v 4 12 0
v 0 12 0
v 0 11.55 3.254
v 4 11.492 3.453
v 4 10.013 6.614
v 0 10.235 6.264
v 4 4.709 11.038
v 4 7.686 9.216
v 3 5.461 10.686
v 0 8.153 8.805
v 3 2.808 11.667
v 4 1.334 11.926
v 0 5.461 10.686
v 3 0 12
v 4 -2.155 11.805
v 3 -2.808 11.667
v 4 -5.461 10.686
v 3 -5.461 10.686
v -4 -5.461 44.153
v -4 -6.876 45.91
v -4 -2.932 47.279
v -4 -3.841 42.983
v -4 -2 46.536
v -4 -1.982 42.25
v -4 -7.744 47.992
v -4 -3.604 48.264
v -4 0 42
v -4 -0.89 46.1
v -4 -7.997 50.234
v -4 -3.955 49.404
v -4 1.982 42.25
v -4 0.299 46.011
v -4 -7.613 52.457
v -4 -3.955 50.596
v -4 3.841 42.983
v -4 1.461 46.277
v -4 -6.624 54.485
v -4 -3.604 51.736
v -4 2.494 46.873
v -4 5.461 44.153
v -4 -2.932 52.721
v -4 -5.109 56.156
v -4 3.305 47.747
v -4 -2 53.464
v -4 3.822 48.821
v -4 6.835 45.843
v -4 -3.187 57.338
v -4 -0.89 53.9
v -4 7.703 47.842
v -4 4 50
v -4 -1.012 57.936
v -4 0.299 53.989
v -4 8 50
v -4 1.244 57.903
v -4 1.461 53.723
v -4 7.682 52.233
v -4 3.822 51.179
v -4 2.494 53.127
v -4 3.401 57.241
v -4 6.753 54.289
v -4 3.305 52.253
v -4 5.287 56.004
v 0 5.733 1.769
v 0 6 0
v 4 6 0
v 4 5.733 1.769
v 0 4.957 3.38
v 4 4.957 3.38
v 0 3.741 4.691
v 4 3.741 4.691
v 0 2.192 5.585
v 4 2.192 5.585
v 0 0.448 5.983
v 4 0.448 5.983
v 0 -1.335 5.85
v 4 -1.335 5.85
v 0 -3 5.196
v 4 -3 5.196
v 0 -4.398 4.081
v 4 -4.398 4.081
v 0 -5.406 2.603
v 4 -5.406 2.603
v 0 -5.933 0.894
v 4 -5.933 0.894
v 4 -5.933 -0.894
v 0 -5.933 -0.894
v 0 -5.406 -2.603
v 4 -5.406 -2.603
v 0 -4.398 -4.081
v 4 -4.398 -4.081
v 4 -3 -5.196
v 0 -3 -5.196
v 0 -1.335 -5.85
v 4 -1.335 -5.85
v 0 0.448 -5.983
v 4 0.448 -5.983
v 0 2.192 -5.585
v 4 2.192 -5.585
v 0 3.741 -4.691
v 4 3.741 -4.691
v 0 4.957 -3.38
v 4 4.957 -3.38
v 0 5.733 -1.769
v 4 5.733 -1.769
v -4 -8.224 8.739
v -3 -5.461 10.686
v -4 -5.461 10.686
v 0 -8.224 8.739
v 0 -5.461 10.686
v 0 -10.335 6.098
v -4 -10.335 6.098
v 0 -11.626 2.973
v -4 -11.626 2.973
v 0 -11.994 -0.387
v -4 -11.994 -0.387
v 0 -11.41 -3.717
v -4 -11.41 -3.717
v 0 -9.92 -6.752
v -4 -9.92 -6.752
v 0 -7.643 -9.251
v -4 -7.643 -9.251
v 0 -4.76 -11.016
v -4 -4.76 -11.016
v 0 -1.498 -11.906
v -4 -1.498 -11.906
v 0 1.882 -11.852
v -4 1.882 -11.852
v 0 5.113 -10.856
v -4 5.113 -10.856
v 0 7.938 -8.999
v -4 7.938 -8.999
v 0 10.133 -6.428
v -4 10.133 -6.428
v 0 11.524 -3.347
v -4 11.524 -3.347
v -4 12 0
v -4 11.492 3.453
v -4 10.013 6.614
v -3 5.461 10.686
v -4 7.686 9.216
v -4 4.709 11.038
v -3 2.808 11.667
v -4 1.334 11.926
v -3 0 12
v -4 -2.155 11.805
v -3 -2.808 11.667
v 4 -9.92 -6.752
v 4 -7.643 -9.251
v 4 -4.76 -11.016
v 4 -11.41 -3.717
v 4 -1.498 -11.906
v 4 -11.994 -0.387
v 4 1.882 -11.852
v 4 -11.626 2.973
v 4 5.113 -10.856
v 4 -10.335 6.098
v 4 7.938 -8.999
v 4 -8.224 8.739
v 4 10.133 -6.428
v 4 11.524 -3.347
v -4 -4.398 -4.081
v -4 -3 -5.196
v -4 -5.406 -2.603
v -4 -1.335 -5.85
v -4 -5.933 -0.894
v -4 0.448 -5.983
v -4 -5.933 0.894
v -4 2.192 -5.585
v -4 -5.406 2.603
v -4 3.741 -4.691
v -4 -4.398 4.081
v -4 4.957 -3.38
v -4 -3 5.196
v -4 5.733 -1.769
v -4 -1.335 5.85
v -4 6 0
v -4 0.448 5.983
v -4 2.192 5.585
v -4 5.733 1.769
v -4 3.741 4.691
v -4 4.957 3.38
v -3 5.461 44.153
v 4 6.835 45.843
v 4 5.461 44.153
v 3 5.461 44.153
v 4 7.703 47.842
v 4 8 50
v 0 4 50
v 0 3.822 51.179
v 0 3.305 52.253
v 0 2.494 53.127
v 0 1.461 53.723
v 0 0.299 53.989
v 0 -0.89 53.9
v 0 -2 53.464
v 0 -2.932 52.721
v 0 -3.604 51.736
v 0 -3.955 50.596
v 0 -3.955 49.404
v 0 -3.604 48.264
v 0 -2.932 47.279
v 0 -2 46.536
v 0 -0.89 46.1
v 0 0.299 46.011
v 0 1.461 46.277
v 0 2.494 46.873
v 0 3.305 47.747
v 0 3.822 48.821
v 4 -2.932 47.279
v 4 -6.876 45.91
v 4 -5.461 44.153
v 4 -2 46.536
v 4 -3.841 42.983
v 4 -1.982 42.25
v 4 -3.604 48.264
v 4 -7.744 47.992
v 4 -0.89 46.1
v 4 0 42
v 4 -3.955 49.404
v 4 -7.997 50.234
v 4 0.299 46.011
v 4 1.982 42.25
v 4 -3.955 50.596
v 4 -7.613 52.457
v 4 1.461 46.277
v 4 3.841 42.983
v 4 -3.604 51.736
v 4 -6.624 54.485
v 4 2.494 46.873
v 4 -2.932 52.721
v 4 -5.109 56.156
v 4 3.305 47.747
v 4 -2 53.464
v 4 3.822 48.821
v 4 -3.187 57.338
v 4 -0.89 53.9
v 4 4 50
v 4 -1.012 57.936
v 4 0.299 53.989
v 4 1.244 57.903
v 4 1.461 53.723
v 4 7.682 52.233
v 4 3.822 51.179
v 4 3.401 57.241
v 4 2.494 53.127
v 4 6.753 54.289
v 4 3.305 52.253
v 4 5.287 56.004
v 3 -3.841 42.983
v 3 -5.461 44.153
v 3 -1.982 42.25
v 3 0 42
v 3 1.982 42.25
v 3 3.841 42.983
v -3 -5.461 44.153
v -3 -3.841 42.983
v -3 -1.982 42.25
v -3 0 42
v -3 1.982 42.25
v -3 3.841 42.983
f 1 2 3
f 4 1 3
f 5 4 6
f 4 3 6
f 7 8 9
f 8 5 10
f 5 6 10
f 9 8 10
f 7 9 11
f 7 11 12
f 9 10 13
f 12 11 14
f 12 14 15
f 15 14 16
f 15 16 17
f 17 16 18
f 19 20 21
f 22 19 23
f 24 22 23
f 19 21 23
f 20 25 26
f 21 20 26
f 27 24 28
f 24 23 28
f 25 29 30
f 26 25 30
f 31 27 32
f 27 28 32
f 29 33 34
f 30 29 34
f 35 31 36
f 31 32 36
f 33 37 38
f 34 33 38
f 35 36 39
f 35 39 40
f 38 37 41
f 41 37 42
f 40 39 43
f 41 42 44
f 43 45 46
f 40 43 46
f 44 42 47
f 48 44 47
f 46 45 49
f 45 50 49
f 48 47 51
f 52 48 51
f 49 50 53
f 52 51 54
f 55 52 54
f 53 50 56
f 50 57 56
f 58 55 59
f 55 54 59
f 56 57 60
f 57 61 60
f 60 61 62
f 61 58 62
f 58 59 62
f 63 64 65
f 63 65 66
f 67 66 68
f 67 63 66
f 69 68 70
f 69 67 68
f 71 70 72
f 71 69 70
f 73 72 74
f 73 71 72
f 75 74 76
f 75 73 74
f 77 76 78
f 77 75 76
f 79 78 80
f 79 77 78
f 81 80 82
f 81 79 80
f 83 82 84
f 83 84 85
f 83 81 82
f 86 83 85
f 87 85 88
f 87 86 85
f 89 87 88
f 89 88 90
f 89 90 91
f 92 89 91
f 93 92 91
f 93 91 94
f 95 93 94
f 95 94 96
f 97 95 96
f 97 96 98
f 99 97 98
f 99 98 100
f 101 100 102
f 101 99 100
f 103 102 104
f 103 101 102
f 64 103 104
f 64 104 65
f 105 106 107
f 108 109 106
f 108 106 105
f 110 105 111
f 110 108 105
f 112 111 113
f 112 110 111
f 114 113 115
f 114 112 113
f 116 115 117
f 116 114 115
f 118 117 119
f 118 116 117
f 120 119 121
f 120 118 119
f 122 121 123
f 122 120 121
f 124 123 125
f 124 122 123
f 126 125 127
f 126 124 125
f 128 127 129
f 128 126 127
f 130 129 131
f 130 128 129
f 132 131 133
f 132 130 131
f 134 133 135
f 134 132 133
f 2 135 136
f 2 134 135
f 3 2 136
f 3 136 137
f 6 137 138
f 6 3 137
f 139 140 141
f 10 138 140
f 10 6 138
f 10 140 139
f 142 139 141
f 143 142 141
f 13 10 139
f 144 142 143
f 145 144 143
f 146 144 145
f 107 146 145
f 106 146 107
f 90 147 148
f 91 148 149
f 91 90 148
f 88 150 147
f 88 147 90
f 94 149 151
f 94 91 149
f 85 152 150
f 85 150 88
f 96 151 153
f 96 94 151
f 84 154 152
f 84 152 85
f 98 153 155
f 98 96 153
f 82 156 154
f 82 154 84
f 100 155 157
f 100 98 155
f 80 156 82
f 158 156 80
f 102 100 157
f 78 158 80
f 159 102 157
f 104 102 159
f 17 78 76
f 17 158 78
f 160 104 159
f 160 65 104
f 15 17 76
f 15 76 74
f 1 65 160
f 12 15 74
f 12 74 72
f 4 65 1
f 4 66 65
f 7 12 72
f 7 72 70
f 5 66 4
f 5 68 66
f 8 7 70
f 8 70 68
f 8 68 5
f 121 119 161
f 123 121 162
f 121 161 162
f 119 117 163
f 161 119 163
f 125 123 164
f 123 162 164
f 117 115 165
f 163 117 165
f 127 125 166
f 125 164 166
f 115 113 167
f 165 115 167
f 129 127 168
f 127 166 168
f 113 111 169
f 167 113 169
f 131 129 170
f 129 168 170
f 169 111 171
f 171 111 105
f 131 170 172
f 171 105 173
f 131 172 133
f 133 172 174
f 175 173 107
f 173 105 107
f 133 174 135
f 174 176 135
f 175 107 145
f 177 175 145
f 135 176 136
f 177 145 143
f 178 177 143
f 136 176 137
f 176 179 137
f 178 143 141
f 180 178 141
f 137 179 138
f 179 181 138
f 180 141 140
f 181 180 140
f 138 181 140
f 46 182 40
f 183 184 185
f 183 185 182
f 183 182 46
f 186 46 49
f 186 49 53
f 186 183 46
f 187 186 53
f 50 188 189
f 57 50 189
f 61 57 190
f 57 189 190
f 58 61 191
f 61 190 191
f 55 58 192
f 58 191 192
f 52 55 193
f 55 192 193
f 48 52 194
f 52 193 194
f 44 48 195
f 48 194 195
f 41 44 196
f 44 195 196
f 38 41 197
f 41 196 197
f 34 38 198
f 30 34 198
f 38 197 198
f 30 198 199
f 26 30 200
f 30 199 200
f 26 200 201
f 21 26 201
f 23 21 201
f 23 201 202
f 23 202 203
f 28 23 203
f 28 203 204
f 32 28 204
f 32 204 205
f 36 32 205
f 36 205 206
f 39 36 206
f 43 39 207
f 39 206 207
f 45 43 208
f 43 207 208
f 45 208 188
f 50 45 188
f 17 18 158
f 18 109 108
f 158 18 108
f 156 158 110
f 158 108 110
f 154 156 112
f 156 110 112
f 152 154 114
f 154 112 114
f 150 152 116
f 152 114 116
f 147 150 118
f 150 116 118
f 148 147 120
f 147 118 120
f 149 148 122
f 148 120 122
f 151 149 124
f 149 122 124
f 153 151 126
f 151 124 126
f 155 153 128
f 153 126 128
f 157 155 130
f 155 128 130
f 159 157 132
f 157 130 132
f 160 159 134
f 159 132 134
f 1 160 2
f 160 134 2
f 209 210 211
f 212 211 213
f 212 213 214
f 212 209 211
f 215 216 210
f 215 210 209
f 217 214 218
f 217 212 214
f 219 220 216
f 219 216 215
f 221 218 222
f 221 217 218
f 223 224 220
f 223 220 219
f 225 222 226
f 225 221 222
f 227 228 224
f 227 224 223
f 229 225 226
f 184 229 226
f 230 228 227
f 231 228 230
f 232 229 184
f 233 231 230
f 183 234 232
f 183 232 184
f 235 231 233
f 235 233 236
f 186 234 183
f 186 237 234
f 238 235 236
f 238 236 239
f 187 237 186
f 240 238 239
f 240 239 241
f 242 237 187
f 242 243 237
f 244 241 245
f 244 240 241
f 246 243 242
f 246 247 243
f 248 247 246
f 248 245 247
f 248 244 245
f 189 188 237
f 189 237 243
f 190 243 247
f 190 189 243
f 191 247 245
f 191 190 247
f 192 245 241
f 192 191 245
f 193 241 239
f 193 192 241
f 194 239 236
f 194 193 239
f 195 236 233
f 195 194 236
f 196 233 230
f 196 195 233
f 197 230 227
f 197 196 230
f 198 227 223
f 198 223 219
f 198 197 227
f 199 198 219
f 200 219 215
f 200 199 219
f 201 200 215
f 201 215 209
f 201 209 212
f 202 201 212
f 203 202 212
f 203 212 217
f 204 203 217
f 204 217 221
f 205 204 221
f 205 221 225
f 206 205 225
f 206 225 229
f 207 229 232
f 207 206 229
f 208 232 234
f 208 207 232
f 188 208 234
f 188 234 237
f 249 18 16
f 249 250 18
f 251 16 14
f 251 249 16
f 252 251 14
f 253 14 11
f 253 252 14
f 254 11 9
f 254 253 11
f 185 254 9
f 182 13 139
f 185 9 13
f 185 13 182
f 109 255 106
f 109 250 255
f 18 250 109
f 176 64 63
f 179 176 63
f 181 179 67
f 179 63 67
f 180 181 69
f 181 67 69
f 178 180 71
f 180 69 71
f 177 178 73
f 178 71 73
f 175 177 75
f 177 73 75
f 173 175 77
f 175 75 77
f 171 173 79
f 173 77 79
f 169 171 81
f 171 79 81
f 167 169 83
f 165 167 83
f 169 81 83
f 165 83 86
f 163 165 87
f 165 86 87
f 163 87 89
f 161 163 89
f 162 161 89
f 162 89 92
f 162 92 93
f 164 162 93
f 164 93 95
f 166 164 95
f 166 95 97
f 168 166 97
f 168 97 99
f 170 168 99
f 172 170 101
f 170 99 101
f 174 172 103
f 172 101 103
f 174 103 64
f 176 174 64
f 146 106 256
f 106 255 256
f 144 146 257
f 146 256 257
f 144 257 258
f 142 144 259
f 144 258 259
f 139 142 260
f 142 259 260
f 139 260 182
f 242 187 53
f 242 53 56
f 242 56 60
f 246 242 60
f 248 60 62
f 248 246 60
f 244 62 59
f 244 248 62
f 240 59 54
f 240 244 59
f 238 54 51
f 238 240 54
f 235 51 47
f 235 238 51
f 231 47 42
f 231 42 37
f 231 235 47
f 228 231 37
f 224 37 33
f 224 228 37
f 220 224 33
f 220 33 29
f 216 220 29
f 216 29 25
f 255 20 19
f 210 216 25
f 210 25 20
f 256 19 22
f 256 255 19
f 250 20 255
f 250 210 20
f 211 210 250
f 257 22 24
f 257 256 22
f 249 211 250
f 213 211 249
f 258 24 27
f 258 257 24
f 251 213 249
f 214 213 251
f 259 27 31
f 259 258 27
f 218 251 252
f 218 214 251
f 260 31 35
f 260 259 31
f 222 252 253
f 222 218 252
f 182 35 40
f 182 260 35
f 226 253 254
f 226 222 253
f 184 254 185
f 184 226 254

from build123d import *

# Parameters (mm, degrees)
F0_R     = 6
F1_DEPTH = 4
F0_R_2   = 4
F2_DEPTH = 3


with BuildPart() as f1:
    # F0 (on Right) → F1 (new body, symmetric)
    with BuildSketch(Plane.YZ):
        with BuildLine():
            ThreePointArc((-5.4605056446, 10.6856388721), (-6.2639417408, -10.2353814715), (12, 0))
            ThreePointArc((12, 0), (10.2353814715, 6.2639417408), (5.4605056446, 10.6856388721))
            ThreePointArc((5.4605056446, 10.6856388721), (0, 12), (-5.4605056446, 10.6856388721))
        make_face()
        Circle(F0_R, mode=Mode.SUBTRACT)
    extrude(amount=F1_DEPTH, both=True)



with BuildPart() as f1b:
    # F0 (on Right) → F1, piece 2 (new body, symmetric)
    with BuildSketch(Plane.YZ):
        with BuildLine():
            ThreePointArc((-5.4605056446, 44.1533874675), (0, 42), (5.4605056446, 44.1533874675))
            ThreePointArc((5.4605056446, 44.1533874675), (7.3377123532, 46.8128417953), (8, 50))
            ThreePointArc((8, 50), (-3.1871582047, 57.3377123532), (-5.4605056446, 44.1533874675))
        make_face()
        with Locations((0, 50)):
            Circle(F0_R_2, mode=Mode.SUBTRACT)
    extrude(amount=F1_DEPTH, both=True)


with BuildPart() as f1_1:
    add(f1.part)

    add(f1b.part)  # F2 merges F1b
    # F0 (on Right) → F2 (join, symmetric)
    with BuildSketch(Plane.YZ):
        with BuildLine():
            ThreePointArc((-5.4605056446, 10.6856388721), (0, 12), (5.4605056446, 10.6856388721))
            Line((5.4605056446, 10.6856388721), (5.4605056446, 44.1533874675))
            ThreePointArc((5.4605056446, 44.1533874675), (0, 42), (-5.4605056446, 44.1533874675))
            Line((-5.4605056446, 44.1533874675), (-5.4605056446, 10.6856388721))
        make_face()
    extrude(amount=F2_DEPTH, both=True)


solid = f1_1.part
